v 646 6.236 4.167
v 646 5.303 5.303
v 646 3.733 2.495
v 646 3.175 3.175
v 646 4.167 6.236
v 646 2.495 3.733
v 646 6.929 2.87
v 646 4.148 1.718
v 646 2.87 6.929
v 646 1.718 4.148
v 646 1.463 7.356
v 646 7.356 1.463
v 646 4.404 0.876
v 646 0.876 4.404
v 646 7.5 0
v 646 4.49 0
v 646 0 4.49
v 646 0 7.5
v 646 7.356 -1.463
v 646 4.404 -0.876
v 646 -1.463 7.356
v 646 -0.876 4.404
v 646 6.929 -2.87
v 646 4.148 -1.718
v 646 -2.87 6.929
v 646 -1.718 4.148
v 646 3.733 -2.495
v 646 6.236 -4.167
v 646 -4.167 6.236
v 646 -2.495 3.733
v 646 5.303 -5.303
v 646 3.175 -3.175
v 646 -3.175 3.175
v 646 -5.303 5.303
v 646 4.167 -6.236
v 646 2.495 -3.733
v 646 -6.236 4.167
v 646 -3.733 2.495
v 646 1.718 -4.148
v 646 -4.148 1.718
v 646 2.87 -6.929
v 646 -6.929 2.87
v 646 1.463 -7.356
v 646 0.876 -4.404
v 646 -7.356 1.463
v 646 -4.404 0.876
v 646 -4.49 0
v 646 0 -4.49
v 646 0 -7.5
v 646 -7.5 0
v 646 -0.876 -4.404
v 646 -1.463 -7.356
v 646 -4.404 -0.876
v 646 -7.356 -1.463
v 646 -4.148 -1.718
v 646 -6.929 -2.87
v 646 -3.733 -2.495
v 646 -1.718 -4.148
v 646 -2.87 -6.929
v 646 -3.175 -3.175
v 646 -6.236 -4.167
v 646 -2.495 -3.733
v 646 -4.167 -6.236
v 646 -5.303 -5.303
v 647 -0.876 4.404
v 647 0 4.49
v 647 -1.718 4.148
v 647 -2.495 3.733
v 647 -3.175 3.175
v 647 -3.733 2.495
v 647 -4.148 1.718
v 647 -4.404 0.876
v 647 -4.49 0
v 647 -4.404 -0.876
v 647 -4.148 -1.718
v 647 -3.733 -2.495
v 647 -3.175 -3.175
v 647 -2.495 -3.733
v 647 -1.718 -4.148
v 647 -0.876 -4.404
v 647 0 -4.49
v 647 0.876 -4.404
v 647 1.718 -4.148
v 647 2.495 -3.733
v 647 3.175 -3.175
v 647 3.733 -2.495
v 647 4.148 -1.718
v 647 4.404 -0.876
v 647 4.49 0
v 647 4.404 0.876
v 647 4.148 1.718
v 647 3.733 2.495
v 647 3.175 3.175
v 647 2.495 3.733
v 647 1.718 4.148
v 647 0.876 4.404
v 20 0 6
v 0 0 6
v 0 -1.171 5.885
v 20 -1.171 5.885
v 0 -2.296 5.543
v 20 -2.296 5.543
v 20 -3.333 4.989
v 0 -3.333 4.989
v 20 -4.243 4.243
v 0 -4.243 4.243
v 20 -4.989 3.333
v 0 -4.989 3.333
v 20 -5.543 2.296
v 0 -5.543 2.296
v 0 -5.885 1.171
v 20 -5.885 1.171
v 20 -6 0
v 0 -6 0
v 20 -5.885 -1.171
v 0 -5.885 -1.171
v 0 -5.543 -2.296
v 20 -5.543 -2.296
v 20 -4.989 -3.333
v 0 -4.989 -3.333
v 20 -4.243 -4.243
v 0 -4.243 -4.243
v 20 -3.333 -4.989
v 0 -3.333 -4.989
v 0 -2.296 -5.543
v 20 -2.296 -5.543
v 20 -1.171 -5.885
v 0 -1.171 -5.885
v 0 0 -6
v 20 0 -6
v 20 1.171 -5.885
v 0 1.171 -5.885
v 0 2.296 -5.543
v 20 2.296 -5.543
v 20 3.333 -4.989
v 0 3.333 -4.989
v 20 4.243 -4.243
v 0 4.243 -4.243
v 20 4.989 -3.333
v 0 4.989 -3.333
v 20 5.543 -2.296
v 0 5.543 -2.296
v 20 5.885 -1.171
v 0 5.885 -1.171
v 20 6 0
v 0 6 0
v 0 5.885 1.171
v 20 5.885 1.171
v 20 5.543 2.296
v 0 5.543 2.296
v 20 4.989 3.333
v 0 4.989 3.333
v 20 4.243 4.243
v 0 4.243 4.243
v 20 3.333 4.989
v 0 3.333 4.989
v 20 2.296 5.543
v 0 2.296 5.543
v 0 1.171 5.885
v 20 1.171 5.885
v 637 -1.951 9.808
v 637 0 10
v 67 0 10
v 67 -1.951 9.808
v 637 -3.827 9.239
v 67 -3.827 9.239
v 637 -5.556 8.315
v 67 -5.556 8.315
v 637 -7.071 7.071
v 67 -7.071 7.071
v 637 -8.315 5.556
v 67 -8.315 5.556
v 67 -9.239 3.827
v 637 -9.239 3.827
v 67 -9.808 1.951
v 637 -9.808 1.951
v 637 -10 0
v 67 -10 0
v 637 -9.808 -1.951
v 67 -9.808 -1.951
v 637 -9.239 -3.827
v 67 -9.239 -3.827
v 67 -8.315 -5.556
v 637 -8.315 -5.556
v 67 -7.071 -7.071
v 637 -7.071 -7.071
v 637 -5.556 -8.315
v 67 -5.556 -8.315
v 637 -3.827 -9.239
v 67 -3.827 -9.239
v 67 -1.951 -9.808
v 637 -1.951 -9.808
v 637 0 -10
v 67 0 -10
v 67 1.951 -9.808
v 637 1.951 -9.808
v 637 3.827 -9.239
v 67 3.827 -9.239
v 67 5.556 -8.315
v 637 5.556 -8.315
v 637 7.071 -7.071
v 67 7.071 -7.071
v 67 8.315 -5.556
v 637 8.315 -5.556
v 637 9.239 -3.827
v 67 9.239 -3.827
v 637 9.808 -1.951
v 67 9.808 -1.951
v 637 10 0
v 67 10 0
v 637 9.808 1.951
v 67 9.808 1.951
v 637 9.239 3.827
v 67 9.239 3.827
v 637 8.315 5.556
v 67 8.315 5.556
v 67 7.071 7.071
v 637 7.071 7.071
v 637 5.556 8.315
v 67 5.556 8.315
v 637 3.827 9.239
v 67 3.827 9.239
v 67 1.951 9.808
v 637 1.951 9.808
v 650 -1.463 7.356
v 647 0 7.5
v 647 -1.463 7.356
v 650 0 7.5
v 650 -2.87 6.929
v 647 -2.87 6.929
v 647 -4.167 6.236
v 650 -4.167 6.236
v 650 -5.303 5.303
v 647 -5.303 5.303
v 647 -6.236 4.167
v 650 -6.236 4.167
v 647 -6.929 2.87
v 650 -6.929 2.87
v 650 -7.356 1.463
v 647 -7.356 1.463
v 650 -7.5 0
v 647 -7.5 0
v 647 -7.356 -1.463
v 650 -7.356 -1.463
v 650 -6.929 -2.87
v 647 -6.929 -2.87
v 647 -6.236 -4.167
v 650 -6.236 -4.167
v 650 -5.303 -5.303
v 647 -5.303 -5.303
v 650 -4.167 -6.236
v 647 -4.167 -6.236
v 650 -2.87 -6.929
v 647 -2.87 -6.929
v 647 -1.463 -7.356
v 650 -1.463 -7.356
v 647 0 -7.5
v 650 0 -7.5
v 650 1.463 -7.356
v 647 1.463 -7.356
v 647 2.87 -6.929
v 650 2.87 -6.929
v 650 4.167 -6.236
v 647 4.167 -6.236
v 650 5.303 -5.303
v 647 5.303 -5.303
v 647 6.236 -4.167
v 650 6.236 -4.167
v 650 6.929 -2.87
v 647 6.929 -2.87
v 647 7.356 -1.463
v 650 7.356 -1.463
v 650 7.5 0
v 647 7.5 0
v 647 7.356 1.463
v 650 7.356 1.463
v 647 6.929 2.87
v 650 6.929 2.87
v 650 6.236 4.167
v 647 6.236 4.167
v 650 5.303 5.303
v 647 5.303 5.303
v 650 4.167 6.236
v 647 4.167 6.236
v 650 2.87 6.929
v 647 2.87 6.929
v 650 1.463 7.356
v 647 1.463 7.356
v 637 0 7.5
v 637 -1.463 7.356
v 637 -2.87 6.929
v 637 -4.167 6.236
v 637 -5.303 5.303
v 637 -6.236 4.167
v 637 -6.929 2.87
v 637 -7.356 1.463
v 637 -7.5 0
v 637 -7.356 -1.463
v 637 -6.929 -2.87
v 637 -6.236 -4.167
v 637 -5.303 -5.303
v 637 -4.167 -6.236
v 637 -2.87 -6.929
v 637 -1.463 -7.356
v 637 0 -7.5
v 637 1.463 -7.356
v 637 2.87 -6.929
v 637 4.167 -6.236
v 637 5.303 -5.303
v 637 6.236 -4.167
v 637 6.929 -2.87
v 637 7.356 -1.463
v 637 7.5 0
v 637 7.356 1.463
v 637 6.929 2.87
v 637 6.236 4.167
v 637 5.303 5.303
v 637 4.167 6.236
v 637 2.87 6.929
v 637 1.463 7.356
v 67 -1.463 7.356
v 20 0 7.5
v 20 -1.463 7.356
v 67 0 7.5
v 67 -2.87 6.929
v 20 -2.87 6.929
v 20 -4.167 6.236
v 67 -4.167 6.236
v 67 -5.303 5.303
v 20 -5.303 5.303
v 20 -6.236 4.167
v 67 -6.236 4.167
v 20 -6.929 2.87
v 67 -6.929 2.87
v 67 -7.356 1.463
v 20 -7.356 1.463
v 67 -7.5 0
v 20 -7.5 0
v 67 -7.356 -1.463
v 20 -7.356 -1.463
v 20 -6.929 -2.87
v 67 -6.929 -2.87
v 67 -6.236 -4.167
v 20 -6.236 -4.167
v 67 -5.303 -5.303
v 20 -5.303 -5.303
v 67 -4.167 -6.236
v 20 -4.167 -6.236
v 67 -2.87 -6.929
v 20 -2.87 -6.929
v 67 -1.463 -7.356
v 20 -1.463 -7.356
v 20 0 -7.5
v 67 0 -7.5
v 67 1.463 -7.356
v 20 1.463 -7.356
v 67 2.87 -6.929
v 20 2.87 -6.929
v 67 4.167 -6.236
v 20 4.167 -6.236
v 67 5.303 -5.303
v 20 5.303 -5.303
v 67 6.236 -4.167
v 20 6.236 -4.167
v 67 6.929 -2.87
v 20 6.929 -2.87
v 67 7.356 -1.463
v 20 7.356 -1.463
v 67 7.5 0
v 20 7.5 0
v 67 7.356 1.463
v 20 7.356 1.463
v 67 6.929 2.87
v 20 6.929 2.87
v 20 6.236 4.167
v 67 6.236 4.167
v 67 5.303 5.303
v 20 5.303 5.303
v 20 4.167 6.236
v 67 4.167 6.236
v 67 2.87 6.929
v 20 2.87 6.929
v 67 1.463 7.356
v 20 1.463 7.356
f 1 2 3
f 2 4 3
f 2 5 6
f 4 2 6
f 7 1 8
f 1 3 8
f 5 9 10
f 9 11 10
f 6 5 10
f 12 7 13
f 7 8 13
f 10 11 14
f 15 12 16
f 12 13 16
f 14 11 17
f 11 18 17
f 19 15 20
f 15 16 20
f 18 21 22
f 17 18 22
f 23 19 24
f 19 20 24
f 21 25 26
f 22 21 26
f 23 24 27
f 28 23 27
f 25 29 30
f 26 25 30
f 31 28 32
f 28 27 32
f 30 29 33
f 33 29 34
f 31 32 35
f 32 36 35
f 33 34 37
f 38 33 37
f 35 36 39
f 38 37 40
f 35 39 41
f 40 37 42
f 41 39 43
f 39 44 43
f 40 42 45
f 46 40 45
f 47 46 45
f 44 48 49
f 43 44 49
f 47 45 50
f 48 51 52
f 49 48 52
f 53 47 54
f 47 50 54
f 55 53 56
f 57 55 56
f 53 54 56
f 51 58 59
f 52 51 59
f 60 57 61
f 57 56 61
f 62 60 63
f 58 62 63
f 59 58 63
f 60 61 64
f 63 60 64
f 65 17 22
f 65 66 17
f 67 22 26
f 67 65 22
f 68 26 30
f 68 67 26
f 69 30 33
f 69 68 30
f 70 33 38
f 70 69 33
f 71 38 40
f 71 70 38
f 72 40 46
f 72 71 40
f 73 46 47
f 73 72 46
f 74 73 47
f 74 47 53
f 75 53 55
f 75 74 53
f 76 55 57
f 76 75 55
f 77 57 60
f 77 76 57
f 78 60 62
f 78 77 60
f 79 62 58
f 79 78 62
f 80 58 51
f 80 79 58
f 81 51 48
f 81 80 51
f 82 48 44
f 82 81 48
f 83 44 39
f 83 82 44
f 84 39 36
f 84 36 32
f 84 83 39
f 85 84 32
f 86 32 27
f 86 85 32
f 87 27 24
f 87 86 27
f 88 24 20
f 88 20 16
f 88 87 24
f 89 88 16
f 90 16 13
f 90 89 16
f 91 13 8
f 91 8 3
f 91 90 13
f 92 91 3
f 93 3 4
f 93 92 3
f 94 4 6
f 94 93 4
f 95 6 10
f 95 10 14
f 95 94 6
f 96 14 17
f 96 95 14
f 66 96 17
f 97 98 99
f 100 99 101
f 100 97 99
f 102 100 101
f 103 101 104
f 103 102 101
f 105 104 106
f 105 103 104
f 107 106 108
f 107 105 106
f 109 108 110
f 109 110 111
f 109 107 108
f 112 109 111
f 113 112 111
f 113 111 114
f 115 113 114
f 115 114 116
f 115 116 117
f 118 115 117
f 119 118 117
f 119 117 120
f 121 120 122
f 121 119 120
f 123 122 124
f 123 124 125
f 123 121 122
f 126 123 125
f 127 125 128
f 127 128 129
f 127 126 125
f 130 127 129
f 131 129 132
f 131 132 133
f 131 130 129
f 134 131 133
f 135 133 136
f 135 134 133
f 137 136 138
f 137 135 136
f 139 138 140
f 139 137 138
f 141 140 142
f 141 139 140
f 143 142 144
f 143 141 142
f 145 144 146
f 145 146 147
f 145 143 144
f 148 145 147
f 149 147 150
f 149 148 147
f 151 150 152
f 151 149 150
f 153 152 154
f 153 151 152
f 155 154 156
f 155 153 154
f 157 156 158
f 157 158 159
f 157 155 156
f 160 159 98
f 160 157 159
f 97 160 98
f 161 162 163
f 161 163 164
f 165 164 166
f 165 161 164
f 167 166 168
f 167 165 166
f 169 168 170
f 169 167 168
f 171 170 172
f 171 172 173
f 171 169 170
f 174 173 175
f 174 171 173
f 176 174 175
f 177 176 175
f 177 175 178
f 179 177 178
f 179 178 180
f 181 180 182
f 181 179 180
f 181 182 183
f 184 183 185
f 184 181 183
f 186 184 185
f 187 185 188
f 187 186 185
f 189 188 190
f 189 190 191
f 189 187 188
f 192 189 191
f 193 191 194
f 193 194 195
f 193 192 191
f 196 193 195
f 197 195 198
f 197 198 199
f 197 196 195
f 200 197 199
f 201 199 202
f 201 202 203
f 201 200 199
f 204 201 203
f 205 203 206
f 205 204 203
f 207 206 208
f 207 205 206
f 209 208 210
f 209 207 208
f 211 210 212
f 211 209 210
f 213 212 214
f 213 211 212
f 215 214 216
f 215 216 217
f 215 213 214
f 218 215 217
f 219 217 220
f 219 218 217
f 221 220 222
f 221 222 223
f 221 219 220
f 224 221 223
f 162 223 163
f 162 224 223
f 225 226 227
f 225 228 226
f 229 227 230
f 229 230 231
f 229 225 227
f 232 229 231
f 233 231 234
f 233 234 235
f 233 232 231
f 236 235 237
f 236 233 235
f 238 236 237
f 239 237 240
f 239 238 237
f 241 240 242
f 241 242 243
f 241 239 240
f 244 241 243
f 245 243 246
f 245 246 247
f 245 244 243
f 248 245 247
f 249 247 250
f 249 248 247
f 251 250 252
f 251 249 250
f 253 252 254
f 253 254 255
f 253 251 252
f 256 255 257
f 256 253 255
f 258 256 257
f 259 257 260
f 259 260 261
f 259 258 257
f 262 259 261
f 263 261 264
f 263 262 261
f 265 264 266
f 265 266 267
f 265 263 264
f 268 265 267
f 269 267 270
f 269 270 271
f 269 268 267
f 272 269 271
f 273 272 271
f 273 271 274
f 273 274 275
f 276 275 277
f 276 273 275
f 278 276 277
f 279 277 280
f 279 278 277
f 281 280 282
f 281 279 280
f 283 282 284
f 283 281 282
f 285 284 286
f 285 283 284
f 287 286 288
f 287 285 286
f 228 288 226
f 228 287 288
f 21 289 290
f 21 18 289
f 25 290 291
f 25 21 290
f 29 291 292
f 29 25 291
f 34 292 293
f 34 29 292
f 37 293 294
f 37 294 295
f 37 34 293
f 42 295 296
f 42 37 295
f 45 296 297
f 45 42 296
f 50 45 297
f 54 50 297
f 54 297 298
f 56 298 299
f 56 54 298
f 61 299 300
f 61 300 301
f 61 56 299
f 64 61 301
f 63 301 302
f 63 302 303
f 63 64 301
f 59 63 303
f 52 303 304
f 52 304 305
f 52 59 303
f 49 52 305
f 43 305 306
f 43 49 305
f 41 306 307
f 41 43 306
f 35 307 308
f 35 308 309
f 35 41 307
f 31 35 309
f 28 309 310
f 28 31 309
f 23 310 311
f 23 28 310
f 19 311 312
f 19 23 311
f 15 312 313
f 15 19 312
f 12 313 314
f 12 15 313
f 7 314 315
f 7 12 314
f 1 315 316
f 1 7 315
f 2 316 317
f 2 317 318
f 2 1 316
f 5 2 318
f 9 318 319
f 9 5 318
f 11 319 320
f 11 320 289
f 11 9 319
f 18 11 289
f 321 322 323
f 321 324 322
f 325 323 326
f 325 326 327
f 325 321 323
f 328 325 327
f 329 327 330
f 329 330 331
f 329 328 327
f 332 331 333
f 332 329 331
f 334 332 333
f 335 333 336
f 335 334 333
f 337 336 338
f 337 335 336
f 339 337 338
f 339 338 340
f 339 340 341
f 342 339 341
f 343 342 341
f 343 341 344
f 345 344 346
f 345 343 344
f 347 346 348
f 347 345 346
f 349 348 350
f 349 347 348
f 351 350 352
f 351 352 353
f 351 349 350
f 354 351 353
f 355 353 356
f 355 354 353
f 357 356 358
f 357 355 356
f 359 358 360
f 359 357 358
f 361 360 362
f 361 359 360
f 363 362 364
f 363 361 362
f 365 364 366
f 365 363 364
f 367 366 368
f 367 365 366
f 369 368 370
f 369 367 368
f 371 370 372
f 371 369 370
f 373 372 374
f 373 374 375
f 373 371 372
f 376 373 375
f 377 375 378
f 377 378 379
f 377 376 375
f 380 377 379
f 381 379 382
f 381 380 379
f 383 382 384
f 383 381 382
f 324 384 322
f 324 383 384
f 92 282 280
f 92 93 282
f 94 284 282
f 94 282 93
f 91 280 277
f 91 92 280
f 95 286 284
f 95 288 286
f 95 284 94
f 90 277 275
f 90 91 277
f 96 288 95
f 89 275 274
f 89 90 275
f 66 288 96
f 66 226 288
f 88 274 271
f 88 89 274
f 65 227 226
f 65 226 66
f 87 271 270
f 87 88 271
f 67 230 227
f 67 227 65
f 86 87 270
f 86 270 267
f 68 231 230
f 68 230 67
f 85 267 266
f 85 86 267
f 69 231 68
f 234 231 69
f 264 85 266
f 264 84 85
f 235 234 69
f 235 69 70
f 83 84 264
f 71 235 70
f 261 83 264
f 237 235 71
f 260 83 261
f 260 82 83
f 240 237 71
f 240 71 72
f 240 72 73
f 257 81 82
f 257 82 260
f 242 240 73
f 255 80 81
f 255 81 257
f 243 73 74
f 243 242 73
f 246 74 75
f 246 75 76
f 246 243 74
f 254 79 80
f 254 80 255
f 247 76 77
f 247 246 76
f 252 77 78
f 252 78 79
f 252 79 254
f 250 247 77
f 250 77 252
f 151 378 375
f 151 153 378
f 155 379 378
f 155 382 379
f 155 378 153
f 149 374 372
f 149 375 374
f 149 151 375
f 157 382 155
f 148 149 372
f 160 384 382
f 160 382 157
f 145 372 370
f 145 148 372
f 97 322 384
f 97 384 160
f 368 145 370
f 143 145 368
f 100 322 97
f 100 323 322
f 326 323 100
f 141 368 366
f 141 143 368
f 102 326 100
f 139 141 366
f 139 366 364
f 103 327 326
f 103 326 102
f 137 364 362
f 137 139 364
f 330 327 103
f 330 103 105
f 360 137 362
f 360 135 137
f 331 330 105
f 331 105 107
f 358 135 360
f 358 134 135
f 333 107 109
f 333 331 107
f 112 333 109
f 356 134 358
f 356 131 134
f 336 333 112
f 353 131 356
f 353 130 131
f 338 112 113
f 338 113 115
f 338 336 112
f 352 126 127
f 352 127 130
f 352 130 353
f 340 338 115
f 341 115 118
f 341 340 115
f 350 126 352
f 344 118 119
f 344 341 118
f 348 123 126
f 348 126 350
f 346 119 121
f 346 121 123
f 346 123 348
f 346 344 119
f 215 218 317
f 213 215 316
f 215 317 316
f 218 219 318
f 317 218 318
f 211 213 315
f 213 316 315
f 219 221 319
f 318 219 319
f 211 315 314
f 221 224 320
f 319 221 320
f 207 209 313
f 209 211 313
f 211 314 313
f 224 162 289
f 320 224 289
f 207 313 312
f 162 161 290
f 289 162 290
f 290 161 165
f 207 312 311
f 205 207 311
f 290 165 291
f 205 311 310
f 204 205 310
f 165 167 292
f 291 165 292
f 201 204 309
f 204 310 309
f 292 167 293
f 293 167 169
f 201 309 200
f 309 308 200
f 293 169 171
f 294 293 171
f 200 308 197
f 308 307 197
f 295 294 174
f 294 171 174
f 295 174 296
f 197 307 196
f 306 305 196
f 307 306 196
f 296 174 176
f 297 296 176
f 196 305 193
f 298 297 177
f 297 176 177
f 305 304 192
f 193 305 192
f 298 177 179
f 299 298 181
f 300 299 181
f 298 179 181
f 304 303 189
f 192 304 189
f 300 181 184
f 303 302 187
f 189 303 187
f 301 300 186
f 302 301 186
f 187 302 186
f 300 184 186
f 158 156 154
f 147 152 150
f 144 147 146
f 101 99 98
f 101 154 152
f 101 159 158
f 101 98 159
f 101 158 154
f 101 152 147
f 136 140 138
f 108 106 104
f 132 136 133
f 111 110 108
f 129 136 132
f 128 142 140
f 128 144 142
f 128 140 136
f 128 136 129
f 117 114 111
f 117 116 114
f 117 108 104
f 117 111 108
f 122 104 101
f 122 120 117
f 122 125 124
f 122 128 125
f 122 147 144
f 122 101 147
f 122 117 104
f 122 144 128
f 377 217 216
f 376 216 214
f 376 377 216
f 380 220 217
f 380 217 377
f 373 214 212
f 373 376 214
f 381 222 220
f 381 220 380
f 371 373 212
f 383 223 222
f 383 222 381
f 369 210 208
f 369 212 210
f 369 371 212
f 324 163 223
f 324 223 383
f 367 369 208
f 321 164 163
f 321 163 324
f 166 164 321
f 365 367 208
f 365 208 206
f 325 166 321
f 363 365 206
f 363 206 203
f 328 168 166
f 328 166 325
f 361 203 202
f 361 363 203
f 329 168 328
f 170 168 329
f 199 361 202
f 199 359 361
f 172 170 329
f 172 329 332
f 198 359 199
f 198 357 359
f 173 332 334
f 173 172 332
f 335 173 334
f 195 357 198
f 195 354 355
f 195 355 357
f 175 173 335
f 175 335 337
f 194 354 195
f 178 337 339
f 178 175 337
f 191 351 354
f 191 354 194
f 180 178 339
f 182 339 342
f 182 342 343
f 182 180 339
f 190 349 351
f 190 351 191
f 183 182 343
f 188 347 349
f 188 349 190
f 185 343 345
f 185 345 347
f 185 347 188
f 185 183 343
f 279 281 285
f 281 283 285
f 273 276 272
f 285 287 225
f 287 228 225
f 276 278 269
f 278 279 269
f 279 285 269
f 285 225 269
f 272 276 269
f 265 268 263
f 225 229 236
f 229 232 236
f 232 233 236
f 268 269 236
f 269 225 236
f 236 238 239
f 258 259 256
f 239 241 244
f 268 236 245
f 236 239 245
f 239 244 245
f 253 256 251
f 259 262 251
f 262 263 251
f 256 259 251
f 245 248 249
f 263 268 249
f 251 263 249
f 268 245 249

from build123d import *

# Parameters (mm, degrees)
SKETCH_W      = 650
SKETCH_H      = 10
SKETCH001_W   = 67
SKETCH001_H   = 2.5
SKETCH002_W   = 20
SKETCH002_H   = 1.5
SKETCH003_W   = 13
SKETCH003_H   = 2.5
SKETCH003_W_2 = 1
SKETCH003_H_2 = 3.01


with BuildPart() as part:
    # Sketch → Revolution (revolve)
    with BuildSketch(Plane.XZ):
        with Locations((325, 5)):
            Rectangle(SKETCH_W, SKETCH_H)
    revolve(axis=Axis((0, 0, 0), (1, 0, 0)))

    # Sketch001 → Groove (revolve, cut)
    with BuildSketch(Plane.XZ):
        with Locations((33.5, 8.75)):
            Rectangle(SKETCH001_W, SKETCH001_H)
    revolve(axis=Axis((0, 0, 0), (1, 0, 0)), mode=Mode.SUBTRACT)

    # Sketch002 → Groove001 (revolve, cut)
    with BuildSketch(Plane.XZ):
        with Locations((10, 6.75)):
            Rectangle(SKETCH002_W, SKETCH002_H)
    revolve(axis=Axis((0, 0, 0), (1, 0, 0)), mode=Mode.SUBTRACT)

    # Sketch003 → Groove002 (revolve, cut)
    with BuildSketch(Plane.XZ):
        with Locations((643.5, 8.75)):
            Rectangle(SKETCH003_W, SKETCH003_H)
        with Locations((646.5, 5.995)):
            Rectangle(SKETCH003_W_2, SKETCH003_H_2)
    revolve(axis=Axis((0, 0, 0), (1, 0, 0)), mode=Mode.SUBTRACT)


solid = part.part
